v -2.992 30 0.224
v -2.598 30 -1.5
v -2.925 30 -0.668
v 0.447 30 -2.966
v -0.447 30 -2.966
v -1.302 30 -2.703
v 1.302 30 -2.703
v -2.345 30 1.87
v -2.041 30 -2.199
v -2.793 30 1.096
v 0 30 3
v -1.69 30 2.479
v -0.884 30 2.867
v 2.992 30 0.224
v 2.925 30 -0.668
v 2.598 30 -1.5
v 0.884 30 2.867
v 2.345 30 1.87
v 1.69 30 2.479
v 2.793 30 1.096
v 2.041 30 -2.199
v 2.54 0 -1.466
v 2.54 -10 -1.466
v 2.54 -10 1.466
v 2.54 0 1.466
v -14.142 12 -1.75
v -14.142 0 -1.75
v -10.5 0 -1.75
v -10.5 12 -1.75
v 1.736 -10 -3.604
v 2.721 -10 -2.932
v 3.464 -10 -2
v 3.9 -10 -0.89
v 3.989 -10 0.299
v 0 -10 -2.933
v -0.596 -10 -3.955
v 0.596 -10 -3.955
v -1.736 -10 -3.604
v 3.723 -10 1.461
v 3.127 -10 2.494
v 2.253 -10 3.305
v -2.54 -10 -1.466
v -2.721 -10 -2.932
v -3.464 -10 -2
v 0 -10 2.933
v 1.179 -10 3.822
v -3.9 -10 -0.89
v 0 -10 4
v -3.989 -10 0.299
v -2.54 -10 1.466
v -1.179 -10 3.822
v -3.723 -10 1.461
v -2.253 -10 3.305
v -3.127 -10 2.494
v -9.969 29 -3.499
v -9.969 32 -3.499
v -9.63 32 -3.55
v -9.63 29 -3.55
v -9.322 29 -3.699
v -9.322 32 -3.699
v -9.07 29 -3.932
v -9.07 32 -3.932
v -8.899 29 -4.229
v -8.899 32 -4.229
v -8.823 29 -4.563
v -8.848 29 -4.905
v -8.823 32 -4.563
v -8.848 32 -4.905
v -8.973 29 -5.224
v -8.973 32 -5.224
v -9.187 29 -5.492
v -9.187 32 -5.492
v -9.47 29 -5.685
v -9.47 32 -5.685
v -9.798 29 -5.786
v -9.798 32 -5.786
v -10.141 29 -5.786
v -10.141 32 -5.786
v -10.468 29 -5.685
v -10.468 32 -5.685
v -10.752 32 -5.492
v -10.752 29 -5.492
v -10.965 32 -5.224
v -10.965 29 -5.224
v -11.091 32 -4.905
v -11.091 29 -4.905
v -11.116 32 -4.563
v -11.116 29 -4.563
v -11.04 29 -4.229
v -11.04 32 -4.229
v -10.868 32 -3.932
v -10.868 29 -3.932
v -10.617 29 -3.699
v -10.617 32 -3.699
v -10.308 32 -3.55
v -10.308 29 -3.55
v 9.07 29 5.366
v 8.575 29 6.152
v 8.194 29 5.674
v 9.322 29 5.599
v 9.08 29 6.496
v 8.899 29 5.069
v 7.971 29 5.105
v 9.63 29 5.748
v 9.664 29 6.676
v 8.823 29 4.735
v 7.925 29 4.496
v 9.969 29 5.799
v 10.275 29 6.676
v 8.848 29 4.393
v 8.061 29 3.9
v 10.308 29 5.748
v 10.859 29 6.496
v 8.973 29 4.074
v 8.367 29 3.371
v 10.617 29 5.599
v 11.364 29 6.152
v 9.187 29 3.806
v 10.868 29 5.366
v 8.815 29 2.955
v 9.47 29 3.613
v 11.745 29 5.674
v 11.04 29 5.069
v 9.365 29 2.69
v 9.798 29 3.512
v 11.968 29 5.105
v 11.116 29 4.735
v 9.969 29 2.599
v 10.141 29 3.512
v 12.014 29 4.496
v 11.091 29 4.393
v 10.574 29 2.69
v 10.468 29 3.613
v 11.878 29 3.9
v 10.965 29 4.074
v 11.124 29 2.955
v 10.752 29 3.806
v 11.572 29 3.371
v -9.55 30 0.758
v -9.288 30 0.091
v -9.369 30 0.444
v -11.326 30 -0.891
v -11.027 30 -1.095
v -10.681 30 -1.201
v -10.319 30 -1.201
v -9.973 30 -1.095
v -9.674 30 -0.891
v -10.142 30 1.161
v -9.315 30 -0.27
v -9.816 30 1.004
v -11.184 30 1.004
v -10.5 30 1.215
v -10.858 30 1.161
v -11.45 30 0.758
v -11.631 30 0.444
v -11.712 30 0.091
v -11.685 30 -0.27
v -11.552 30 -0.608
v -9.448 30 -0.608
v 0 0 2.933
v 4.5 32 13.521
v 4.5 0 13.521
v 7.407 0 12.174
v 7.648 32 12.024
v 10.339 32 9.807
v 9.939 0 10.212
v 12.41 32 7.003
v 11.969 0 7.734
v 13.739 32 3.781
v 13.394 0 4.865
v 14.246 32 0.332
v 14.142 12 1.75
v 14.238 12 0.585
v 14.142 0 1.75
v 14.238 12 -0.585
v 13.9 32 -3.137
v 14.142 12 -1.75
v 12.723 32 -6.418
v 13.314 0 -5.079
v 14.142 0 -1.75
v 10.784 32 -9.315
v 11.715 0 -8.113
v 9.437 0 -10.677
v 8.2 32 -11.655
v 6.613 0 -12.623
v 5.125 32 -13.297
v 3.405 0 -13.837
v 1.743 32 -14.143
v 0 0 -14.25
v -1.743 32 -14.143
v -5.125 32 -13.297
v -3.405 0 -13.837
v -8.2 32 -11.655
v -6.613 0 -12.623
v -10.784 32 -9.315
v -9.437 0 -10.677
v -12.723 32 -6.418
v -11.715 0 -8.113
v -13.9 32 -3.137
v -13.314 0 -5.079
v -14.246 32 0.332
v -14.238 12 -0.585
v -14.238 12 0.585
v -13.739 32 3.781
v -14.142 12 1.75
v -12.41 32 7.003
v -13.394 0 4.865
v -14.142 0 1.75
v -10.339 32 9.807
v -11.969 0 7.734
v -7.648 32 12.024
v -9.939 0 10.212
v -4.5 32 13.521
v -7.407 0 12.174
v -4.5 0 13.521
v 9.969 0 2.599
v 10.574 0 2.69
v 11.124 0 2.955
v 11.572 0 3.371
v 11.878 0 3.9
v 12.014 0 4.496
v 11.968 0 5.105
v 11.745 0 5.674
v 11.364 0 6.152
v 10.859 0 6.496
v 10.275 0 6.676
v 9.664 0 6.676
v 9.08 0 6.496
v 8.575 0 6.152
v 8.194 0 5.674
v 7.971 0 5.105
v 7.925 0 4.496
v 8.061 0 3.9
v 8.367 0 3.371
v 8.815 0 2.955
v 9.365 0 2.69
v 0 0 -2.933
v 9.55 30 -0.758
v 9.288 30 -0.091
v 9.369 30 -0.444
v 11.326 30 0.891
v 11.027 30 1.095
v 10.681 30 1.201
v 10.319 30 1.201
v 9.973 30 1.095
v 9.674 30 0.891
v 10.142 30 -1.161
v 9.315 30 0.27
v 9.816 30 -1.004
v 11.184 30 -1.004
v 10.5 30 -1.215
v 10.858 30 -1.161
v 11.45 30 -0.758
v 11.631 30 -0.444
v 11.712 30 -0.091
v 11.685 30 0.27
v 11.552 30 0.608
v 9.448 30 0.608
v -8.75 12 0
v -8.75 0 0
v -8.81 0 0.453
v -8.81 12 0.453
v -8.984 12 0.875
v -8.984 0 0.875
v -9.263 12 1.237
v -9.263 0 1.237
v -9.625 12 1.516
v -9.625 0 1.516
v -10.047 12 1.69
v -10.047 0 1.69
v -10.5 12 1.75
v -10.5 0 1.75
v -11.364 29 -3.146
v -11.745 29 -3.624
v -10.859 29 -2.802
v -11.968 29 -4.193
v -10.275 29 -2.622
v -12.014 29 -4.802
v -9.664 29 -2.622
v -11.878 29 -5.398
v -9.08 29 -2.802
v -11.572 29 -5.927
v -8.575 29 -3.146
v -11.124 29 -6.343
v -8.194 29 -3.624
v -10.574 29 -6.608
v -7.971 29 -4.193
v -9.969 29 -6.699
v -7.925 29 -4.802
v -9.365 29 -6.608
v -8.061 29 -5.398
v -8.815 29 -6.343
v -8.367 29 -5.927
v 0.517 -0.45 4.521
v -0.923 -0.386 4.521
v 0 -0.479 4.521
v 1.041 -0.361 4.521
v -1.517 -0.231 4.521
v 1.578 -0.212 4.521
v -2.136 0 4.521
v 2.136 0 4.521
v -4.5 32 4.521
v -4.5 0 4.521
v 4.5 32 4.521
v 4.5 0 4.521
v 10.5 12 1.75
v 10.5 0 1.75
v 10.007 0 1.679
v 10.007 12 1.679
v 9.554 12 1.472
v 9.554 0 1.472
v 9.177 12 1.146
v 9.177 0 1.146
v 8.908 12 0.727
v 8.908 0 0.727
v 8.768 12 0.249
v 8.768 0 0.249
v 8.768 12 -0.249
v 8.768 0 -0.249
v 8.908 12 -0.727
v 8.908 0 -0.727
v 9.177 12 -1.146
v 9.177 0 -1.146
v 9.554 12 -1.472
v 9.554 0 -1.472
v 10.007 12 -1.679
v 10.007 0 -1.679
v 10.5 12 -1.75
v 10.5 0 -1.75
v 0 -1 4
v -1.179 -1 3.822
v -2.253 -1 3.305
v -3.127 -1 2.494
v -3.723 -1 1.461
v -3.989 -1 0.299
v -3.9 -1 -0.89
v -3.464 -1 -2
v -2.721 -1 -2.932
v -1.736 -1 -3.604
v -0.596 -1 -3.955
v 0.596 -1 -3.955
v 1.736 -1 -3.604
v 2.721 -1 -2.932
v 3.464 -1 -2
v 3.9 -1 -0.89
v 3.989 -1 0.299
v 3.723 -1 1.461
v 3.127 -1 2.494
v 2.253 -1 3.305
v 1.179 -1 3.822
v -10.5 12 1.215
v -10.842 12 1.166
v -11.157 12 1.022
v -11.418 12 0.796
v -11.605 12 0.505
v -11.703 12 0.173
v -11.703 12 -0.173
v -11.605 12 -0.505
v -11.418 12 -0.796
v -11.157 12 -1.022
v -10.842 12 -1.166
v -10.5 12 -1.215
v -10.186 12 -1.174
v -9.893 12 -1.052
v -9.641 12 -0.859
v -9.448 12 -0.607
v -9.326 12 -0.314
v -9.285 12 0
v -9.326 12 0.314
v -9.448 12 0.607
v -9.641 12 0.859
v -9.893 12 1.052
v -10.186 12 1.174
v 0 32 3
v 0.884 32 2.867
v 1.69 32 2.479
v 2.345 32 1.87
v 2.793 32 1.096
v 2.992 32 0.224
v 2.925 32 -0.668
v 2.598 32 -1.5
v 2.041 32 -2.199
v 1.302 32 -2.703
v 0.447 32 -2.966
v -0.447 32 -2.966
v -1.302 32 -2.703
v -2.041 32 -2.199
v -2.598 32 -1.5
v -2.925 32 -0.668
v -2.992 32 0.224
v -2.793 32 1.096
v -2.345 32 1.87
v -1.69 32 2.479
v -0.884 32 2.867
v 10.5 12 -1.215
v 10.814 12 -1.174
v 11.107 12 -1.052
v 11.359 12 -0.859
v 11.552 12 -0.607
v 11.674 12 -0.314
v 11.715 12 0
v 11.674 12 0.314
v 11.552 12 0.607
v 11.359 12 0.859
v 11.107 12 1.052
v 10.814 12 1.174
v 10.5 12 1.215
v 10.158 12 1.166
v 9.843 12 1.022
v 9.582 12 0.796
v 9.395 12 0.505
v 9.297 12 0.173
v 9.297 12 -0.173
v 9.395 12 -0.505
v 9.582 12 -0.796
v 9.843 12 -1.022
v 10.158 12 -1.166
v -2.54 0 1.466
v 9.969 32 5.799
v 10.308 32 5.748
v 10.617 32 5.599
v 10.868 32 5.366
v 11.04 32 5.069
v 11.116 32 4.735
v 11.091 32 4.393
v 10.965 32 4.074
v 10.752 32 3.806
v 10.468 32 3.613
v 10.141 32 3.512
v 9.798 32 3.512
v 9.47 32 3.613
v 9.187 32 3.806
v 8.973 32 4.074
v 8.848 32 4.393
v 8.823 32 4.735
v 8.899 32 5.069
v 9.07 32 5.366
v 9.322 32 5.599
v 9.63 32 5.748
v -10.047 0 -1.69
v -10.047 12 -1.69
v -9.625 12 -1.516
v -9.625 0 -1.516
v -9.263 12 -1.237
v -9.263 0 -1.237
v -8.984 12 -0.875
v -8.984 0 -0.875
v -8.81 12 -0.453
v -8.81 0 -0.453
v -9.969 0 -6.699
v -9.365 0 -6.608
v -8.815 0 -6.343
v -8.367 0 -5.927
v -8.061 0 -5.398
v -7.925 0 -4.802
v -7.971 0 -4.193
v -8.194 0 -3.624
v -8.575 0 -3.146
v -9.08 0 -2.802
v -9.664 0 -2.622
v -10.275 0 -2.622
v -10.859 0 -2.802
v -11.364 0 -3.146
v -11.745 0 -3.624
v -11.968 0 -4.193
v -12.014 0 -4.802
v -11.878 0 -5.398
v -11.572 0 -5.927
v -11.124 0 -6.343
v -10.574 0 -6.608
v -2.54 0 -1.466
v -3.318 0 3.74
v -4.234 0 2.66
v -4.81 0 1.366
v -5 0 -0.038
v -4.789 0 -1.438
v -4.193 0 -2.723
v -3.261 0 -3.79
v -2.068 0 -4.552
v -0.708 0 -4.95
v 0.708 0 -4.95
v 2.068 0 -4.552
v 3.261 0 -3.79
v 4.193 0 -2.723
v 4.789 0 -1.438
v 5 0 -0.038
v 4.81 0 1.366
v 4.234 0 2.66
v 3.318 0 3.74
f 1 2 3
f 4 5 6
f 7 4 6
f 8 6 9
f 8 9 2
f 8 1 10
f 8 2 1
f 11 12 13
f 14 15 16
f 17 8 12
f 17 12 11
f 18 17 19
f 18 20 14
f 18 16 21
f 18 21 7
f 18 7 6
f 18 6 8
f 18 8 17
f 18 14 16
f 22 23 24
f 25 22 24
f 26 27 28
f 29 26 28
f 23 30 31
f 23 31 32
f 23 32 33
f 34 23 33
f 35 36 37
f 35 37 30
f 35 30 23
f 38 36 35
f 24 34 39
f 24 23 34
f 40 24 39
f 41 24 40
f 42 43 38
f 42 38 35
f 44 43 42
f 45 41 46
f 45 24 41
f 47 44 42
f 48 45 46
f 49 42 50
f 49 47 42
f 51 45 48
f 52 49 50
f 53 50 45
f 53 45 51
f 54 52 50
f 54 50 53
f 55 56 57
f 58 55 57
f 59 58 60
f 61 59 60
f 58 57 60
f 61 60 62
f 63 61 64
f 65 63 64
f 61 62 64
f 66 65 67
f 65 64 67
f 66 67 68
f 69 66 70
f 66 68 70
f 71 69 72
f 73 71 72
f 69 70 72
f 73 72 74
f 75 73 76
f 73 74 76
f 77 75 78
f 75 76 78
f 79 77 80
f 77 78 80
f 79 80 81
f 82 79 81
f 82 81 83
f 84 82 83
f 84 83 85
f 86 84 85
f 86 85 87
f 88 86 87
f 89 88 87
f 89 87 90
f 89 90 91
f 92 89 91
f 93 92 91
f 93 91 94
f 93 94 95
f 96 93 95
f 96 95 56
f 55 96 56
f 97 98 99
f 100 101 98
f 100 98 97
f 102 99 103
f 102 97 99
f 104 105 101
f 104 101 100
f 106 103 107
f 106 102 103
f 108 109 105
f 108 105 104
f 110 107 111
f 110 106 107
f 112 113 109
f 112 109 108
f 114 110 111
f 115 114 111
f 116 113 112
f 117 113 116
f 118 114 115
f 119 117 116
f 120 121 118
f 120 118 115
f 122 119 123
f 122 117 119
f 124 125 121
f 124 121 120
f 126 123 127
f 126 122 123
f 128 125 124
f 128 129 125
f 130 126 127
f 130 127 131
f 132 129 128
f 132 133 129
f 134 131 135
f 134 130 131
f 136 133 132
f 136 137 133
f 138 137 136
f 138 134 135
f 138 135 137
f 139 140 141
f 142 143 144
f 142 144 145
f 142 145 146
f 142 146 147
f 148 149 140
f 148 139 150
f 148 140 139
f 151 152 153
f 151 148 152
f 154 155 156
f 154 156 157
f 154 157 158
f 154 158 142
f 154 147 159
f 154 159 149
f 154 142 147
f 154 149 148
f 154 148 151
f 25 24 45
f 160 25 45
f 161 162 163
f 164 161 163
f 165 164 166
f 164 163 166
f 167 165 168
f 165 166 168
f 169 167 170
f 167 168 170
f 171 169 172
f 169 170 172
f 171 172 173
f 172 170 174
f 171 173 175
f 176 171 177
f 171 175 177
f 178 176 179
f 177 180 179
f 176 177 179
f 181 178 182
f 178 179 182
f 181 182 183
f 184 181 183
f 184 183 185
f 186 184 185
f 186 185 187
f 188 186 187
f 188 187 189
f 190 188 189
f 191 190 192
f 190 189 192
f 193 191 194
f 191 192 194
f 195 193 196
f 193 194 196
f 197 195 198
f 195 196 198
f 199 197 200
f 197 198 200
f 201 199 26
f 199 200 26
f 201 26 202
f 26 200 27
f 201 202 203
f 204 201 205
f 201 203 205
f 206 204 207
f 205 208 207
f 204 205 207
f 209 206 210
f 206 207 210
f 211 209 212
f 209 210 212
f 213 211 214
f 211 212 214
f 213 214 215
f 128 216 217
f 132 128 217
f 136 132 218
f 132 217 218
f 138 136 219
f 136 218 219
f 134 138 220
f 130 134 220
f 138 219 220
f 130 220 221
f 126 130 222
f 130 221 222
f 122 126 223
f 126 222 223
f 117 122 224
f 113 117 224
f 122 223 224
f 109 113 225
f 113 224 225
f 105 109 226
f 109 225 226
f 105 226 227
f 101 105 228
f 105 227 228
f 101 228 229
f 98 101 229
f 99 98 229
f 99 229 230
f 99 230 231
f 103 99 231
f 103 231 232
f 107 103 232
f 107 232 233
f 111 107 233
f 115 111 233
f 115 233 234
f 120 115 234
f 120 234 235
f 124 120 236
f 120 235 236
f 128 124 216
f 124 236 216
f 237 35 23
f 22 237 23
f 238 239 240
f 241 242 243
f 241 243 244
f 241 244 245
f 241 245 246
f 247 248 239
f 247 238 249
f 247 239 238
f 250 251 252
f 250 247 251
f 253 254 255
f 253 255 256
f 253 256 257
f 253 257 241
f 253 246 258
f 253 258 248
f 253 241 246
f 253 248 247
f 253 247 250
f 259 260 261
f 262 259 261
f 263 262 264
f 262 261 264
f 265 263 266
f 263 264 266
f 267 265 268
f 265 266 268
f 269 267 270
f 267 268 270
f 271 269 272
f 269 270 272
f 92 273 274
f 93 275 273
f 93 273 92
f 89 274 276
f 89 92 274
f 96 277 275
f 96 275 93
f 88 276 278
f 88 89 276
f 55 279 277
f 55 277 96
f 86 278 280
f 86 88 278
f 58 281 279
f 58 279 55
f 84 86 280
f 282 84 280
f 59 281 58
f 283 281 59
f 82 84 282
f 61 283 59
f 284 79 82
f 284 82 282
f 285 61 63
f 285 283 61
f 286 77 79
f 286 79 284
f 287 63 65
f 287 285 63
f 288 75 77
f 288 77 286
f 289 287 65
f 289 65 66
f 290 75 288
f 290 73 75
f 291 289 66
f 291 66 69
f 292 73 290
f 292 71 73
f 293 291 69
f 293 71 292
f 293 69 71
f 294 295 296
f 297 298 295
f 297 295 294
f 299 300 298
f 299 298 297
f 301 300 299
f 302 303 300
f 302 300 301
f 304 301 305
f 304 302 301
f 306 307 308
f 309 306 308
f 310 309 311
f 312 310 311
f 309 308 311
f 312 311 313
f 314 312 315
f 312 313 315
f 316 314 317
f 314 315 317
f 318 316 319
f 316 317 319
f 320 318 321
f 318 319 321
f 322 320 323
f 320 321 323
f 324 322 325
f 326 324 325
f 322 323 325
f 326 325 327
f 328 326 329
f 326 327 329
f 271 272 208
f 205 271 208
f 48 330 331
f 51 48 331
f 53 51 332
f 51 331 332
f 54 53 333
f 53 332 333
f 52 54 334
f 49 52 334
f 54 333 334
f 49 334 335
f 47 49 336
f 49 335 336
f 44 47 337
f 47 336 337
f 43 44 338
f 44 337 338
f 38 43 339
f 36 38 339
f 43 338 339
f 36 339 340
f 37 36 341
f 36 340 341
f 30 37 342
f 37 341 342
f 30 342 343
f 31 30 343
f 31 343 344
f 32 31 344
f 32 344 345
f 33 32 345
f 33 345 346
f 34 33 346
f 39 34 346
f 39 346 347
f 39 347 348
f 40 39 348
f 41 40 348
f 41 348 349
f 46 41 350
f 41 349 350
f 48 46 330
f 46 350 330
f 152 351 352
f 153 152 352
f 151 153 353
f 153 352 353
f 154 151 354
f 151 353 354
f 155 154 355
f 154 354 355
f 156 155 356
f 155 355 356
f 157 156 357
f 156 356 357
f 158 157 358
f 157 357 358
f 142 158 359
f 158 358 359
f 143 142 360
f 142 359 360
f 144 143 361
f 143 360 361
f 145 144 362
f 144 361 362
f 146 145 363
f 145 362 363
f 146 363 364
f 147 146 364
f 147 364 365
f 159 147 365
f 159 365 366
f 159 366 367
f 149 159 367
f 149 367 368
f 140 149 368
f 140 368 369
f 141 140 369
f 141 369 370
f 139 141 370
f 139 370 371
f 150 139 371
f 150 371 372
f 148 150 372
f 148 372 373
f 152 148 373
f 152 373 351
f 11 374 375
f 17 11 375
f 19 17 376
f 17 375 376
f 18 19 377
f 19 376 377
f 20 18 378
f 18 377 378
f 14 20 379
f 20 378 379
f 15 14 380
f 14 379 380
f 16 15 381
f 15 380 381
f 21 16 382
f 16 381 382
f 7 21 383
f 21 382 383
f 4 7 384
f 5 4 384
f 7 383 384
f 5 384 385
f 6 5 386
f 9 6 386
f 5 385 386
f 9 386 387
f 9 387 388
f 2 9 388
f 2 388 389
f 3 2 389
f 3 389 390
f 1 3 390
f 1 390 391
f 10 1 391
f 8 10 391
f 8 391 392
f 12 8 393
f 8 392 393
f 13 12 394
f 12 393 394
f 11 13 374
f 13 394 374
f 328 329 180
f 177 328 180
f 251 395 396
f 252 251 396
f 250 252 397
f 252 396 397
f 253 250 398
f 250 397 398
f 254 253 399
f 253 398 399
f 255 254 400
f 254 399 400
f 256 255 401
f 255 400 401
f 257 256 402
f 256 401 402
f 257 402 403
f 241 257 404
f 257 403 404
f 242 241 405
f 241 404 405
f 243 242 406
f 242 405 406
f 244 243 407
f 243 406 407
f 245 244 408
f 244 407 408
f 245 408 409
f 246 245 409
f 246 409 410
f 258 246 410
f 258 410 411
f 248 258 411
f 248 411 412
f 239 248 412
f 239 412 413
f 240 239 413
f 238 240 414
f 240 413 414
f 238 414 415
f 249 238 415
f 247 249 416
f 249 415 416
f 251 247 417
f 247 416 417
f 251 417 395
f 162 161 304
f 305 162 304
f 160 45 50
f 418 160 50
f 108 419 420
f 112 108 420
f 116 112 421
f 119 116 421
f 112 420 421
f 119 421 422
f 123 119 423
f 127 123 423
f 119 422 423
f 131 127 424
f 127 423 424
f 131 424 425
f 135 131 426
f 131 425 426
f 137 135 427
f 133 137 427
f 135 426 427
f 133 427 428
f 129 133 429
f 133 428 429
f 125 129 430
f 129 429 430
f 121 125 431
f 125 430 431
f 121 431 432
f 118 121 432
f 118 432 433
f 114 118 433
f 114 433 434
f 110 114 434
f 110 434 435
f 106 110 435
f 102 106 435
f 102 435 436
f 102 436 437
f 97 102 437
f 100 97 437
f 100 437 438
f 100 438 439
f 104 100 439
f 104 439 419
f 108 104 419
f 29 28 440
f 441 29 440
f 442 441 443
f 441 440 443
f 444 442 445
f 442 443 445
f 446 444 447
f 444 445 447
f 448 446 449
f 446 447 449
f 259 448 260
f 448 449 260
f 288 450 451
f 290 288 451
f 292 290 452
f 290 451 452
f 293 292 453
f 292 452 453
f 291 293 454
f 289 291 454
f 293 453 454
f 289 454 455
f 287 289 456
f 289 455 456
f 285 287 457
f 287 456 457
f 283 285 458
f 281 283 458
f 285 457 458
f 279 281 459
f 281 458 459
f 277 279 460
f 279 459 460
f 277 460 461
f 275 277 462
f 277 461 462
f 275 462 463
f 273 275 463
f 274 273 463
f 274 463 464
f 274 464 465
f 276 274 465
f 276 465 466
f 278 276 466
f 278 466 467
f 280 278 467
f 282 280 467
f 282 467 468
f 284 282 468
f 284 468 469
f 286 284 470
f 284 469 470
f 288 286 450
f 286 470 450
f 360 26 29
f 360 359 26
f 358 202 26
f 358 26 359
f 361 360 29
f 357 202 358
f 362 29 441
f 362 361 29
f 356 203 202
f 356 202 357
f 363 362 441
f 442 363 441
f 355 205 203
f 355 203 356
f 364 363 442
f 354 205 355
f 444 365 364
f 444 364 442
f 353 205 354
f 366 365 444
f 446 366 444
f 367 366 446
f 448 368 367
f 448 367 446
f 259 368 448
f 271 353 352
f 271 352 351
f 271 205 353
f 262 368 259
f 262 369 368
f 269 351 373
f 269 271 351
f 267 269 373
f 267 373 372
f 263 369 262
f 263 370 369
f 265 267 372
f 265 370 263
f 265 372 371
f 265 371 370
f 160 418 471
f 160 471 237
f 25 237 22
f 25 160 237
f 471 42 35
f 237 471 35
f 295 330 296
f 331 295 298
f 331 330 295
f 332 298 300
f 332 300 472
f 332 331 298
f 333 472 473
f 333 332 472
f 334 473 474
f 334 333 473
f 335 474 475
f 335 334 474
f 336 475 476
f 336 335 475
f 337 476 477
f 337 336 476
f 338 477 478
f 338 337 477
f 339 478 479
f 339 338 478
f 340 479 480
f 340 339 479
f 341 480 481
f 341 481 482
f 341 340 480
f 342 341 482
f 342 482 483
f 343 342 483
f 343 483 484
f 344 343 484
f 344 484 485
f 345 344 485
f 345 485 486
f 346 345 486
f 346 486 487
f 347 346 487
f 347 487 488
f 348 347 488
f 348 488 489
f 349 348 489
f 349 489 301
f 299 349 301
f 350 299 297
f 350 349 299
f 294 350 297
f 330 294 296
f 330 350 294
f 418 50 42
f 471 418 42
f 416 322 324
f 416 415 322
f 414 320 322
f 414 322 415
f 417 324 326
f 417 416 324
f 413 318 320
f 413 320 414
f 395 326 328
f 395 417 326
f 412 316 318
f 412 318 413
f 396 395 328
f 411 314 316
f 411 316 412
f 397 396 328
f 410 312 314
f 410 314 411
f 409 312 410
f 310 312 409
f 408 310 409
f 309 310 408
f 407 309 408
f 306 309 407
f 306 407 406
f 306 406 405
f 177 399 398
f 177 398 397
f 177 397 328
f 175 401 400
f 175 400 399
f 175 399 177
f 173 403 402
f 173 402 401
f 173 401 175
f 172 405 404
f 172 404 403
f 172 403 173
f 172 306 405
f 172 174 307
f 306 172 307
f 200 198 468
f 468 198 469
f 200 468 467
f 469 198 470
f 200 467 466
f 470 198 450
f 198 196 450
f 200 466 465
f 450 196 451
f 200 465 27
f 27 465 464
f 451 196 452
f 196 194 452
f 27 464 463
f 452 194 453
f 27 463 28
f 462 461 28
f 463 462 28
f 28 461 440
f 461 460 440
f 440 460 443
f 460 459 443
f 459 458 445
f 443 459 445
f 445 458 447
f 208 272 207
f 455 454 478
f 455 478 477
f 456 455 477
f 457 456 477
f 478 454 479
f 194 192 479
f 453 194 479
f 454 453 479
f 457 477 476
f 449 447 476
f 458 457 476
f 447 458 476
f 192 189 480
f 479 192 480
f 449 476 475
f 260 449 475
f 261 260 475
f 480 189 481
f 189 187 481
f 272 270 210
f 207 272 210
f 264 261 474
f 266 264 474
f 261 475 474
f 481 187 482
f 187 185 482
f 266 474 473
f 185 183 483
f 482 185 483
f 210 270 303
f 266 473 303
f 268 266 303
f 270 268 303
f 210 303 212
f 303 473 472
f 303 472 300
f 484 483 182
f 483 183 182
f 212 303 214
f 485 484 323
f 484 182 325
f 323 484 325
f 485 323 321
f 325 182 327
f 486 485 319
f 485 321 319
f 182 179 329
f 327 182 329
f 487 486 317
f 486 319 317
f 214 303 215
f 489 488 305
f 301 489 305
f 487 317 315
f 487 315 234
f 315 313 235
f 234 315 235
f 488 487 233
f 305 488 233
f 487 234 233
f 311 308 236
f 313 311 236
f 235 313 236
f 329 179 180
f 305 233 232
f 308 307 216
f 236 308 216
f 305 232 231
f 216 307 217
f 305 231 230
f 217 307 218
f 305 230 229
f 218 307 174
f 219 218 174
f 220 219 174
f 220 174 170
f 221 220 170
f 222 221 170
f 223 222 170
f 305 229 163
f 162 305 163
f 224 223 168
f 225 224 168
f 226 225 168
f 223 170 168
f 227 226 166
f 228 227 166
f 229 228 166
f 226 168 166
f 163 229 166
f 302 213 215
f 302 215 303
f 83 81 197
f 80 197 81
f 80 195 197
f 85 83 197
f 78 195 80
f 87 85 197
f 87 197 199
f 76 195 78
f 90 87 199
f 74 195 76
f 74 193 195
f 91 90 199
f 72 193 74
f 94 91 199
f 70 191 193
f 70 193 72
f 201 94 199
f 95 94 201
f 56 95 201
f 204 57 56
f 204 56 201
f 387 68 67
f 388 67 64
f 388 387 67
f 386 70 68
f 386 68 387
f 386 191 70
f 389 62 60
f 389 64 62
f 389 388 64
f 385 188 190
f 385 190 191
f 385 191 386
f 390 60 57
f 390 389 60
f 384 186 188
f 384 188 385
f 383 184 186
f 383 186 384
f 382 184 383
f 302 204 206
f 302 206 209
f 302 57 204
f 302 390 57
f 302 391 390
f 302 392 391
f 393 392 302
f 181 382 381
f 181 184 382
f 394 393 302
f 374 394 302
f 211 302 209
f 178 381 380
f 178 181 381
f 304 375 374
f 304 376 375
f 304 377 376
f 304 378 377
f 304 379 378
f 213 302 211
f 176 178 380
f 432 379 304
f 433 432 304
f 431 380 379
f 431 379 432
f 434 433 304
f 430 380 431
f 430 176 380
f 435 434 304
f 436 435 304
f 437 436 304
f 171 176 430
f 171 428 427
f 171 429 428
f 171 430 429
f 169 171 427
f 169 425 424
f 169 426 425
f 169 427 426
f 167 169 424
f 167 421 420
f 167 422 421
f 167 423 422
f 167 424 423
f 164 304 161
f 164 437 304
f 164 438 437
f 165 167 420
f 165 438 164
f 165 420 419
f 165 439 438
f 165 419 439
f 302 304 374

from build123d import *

# Parameters (mm, degrees)
SKETCH_1_R          = 14.25
EXTRUDE_1_DEPTH     = 32
SKETCH_3_R          = 1.215
CUT_EXTRUDE_1_DEPTH = 30
SKETCH_4_R          = 4
EXTRUDE_2_DEPTH     = 10
CUT_EXTRUDE_2_DEPTH = 10
CHAMFER_1_SIZE      = 1
CUT_EXTRUDE_3_DEPTH = 47.58460046
SKETCH_7_R          = 1.15
CUT_EXTRUDE_4_DEPTH = 47.58460046
SKETCH_8_R          = 3
CUT_EXTRUDE_5_DEPTH = 2
SKETCH_9_R          = 1.215
CUT_EXTRUDE_6_DEPTH = 12
SKETCH_10_R         = 2.05
CUT_EXTRUDE_7_DEPTH = 29


with BuildPart() as part:
    # 草图1 → 凸台-拉伸1 (new body)
    with BuildSketch(Plane(origin=(0, 0, 0), x_dir=(1, 0, 0), z_dir=(0, 1, 0))):
        Circle(SKETCH_1_R)
    extrude(amount=EXTRUDE_1_DEPTH)

    # 草图3 → 切除-拉伸1 (cut)
    with BuildSketch(Plane.XZ):
        with Locations((10.5, 0)):
            Circle(SKETCH_3_R)
        with Locations((-10.5, 0)):
            Circle(SKETCH_3_R)
    extrude(amount=-CUT_EXTRUDE_1_DEPTH, mode=Mode.SUBTRACT)

    # 草图4 → 凸台-拉伸2 (add)
    with BuildSketch(Plane.XZ):
        Circle(SKETCH_4_R)
    extrude(amount=EXTRUDE_2_DEPTH)

    # 草图5 → 切除-拉伸2 (cut)
    with BuildSketch(Plane.XZ.offset(10)):
        Polygon((0, -2.932939367), (2.54, -1.466469684), (2.54, 1.466469684), (0, 2.932939367), (-2.54, 1.466469684), (-2.54, -1.466469684), align=None)
    extrude(amount=-CUT_EXTRUDE_2_DEPTH, mode=Mode.SUBTRACT)

    # 倒角1
    chamfer_1_edges = [part.edges().sort_by_distance(p)[0] for p in [
        (-4, 0, 0),
    ]]
    chamfer(chamfer_1_edges, length=CHAMFER_1_SIZE)

    # 草图6 → 切除-拉伸3 (cut, through all)
    with BuildSketch(Plane(origin=(0, 32, 0), x_dir=(1, 0, 0), z_dir=(0, 1, 0))):
        with BuildLine():
            Line((4.5, -4.520817283), (-4.5, -4.520817283))
            Line((-4.5, -4.520817283), (-4.5, -13.520817283))
            ThreePointArc((-4.5, -13.520817283), (0, -14.25), (4.5, -13.520817283))
            Line((4.5, -13.520817283), (4.5, -4.520817283))
        make_face()
    extrude(amount=-CUT_EXTRUDE_3_DEPTH, mode=Mode.SUBTRACT)

    # 草图7 → 切除-拉伸4 (cut, through all)
    with BuildSketch(Plane(origin=(0, 32, 0), x_dir=(1, 0, 0), z_dir=(0, 1, 0))):
        with Locations((-9.969385657, 4.648800879)):
            Circle(SKETCH_7_R)
        with Locations((9.969385657, -4.648800879)):
            Circle(SKETCH_7_R)
    extrude(amount=-CUT_EXTRUDE_4_DEPTH, mode=Mode.SUBTRACT)

    # 草图8 → 切除-拉伸5 (cut)
    with BuildSketch(Plane(origin=(0, 32, 0), x_dir=(1, 0, 0), z_dir=(0, 1, 0))):
        Circle(SKETCH_8_R)
    extrude(amount=-CUT_EXTRUDE_5_DEPTH, mode=Mode.SUBTRACT)

    # 草图9 → 切除-拉伸6 (cut)
    # profile 1 of 2: a face of its own
    with BuildSketch(Plane.XZ):
        with BuildLine():
            ThreePointArc((-14.142135624, 1.75), (-14.25, 0), (-14.142135624, -1.75))
            Line((-14.142135624, -1.75), (-10.5, -1.75))
            ThreePointArc((-10.5, -1.75), (-8.75, 0), (-10.5, 1.75))
            Line((-10.5, 1.75), (-14.142135624, 1.75))
        make_face()
        with Locations((-10.5, 0)):
            Circle(SKETCH_9_R, mode=Mode.SUBTRACT)
    # profile 2 of 2: a face of its own
    with BuildSketch(Plane.XZ):
        with BuildLine():
            Line((10.5, -1.75), (14.142135624, -1.75))
            ThreePointArc((14.142135624, -1.75), (14.25, 0), (14.142135624, 1.75))
            Line((14.142135624, 1.75), (10.5, 1.75))
            ThreePointArc((10.5, 1.75), (8.75, 0), (10.5, -1.75))
        make_face()
        with Locations((10.5, 0)):
            Circle(SKETCH_9_R, mode=Mode.SUBTRACT)
    extrude(amount=-CUT_EXTRUDE_6_DEPTH, mode=Mode.SUBTRACT)

    # 草图10 → 切除-拉伸7 (cut)
    with BuildSketch(Plane.XZ):
        with Locations((-9.969385657, -4.648800879)):
            Circle(SKETCH_10_R)
        with Locations((9.969385657, 4.648800879)):
            Circle(SKETCH_10_R)
    extrude(amount=-CUT_EXTRUDE_7_DEPTH, mode=Mode.SUBTRACT)


solid = part.part
